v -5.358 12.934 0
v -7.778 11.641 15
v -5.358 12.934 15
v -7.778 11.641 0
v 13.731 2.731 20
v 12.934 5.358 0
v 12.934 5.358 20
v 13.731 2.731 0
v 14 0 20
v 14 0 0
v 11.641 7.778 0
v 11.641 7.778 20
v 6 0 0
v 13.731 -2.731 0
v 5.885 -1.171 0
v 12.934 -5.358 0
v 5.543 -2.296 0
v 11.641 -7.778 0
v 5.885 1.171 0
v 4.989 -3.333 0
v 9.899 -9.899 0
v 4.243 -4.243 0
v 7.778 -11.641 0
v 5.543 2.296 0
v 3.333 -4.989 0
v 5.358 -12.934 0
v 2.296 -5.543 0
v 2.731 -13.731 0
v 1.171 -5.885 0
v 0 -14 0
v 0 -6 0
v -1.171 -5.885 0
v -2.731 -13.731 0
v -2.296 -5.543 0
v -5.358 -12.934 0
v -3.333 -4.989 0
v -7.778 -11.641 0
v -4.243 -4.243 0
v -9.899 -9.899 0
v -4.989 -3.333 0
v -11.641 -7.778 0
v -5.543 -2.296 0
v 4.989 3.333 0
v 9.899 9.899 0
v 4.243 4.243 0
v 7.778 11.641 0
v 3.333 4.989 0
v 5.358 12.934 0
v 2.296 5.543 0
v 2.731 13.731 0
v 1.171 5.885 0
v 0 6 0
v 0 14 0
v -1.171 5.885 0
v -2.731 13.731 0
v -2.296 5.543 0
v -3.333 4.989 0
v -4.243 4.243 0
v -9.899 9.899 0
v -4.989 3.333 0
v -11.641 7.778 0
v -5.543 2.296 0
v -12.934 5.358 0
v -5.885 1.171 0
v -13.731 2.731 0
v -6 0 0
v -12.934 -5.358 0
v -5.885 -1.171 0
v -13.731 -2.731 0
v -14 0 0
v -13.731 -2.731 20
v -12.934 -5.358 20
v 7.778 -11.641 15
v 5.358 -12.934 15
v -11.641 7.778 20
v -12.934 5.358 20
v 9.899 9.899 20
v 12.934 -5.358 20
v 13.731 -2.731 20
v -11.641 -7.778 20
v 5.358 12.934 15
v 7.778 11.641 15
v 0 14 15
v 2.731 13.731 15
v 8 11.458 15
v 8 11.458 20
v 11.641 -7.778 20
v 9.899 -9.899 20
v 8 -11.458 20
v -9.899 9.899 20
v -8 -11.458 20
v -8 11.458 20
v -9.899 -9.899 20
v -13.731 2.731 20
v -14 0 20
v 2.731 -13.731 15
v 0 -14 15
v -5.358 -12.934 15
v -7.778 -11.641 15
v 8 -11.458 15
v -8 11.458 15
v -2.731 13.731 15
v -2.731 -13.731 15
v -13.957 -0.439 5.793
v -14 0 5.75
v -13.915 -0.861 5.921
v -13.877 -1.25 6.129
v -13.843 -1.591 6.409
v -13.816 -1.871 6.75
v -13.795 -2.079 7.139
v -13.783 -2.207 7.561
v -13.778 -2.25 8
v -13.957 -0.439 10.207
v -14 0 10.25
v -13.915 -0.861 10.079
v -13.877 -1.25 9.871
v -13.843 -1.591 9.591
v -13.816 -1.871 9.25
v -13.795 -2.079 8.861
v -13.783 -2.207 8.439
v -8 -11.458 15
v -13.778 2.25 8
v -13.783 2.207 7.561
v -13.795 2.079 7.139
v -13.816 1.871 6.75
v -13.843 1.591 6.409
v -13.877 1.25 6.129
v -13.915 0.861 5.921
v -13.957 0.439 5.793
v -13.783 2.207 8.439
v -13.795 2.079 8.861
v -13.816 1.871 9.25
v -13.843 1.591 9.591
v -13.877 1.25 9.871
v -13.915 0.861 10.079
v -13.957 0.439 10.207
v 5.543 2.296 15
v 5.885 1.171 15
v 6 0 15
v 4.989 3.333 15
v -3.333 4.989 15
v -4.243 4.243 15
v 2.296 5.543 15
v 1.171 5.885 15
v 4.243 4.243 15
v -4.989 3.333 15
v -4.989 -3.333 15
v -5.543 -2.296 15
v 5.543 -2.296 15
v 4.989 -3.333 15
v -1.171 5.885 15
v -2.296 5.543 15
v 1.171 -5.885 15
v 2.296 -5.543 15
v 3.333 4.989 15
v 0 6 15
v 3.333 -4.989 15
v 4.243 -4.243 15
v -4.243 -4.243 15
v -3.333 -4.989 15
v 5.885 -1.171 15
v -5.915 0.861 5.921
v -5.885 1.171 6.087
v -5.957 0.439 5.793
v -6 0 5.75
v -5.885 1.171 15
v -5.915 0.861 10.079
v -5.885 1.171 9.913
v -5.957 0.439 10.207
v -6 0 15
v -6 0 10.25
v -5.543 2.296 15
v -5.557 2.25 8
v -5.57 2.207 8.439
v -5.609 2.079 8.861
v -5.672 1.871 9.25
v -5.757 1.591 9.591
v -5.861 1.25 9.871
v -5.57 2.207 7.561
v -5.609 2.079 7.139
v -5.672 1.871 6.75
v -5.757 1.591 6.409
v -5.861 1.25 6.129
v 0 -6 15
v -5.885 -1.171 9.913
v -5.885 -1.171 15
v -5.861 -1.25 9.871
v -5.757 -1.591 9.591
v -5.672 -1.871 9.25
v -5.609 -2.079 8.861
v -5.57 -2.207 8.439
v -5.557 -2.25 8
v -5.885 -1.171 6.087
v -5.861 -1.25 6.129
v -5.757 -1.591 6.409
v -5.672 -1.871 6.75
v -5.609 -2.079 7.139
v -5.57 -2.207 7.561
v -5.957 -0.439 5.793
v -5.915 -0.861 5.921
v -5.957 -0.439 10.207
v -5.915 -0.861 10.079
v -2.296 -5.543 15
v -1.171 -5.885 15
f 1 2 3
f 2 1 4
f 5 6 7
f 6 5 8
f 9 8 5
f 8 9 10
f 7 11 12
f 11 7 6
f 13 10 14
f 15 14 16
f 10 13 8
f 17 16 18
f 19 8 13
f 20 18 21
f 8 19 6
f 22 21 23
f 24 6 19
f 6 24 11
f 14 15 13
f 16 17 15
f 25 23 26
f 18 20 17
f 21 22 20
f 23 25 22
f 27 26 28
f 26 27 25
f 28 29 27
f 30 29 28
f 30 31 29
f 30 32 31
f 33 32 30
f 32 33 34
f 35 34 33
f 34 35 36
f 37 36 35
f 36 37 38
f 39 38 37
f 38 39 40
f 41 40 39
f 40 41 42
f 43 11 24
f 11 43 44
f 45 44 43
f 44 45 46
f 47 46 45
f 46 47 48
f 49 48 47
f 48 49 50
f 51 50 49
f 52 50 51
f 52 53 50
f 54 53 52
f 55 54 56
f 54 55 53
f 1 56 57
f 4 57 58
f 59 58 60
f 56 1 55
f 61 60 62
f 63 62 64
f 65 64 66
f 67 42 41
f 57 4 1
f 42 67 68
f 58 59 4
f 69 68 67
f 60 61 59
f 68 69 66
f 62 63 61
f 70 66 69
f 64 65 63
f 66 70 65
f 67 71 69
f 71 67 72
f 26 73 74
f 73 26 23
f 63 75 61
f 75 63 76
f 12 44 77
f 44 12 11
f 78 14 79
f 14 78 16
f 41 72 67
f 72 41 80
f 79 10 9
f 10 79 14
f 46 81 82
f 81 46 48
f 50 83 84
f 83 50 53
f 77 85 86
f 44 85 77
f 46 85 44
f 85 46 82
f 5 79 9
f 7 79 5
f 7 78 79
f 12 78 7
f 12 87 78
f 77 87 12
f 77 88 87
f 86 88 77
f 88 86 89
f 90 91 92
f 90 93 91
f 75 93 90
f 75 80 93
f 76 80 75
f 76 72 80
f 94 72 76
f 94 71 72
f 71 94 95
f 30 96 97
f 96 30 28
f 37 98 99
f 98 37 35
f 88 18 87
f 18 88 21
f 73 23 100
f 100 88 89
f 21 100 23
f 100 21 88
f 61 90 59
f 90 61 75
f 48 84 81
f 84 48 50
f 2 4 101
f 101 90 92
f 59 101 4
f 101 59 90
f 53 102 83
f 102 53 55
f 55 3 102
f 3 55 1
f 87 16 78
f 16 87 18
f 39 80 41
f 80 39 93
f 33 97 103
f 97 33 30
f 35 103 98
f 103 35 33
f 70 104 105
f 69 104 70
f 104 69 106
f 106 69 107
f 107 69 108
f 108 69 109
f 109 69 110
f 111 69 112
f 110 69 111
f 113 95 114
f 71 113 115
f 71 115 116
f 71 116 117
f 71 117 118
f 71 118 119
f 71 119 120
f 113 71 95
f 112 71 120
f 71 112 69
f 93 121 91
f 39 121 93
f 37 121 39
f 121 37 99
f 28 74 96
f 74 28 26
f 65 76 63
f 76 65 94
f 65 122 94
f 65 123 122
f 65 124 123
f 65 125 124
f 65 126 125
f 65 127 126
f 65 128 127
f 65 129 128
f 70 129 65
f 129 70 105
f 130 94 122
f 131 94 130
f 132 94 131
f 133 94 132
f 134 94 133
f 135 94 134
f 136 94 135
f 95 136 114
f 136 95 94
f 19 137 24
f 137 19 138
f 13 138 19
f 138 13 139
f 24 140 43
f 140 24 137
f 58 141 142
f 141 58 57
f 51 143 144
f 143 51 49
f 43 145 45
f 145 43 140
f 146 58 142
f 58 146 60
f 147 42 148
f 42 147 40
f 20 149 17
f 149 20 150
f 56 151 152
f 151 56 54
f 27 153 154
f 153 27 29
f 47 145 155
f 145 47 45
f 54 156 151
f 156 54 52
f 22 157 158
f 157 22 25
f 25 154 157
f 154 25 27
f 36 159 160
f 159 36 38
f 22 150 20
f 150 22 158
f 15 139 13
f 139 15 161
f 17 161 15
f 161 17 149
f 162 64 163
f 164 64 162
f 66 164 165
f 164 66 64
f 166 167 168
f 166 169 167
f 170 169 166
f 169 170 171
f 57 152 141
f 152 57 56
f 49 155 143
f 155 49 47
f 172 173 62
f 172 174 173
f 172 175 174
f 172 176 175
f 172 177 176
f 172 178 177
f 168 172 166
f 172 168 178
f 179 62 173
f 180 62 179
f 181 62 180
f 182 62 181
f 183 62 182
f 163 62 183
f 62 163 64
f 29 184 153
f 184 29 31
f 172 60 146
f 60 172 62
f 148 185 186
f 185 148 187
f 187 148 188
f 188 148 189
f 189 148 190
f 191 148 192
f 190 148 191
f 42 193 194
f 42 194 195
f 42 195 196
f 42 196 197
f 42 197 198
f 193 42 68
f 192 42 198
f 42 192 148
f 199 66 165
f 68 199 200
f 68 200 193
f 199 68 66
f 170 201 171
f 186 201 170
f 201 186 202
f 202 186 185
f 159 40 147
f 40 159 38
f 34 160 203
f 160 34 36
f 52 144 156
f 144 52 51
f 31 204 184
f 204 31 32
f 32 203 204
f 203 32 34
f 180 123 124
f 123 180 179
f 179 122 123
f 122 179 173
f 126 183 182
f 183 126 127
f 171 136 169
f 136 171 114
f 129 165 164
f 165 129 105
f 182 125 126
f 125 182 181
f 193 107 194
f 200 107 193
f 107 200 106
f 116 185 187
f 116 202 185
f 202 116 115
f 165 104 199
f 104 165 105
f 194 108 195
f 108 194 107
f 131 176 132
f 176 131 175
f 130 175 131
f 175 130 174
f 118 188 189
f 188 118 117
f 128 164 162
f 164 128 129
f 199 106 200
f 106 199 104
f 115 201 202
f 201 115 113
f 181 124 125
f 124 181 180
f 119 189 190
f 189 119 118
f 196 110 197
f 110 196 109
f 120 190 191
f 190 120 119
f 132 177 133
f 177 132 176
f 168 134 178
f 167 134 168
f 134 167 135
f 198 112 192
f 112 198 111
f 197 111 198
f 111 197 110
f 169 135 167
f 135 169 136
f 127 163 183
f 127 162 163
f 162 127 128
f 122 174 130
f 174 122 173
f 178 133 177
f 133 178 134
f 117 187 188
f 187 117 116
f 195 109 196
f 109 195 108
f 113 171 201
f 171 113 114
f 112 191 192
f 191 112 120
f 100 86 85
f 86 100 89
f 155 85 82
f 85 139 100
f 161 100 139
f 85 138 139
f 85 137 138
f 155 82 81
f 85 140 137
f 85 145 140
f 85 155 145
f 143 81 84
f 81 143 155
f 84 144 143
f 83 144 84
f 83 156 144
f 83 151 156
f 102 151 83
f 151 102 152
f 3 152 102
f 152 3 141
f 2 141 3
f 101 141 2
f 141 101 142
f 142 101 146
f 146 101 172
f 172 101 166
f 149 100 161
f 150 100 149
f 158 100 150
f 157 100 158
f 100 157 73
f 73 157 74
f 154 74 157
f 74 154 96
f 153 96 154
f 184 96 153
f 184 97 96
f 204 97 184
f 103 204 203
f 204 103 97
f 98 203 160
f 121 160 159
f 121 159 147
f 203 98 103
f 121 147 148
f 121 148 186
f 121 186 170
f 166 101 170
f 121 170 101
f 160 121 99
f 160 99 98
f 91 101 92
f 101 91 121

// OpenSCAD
$fn = 32;

// ----------------------------------------------------------------------
// Oldham coupling hub: 28 x 20 mm
// ----------------------------------------------------------------------

// --- parameters (mm) ---
flange_dia = 28;          // hub diameter
flange_len = 16;          // hub length
hub_bore = 12;            // shaft bore
key_w = 16;               // drive tongue width
tongue_h = 4;             // drive tongue height
set_d = 4.5;              // set screw tap hole

module hub() {
  /* the slot side is a raised disc with a groove milled across it */
  cylinder(h = flange_len + tongue_h, d = flange_dia);
}

difference() {
  hub();
  translate([0, 0, -1]) cylinder(h = flange_len + tongue_h + 2, d = hub_bore);
  translate([-flange_dia / 2 - 1, 0, flange_len * 0.5])
    rotate([0, 90, 0]) cylinder(h = flange_dia / 2 + 2, d = set_d);
  translate([-key_w / 2, -flange_dia / 2 - 1, flange_len - 1])
    cube([key_w, flange_dia + 2, tongue_h + 1]);
}
